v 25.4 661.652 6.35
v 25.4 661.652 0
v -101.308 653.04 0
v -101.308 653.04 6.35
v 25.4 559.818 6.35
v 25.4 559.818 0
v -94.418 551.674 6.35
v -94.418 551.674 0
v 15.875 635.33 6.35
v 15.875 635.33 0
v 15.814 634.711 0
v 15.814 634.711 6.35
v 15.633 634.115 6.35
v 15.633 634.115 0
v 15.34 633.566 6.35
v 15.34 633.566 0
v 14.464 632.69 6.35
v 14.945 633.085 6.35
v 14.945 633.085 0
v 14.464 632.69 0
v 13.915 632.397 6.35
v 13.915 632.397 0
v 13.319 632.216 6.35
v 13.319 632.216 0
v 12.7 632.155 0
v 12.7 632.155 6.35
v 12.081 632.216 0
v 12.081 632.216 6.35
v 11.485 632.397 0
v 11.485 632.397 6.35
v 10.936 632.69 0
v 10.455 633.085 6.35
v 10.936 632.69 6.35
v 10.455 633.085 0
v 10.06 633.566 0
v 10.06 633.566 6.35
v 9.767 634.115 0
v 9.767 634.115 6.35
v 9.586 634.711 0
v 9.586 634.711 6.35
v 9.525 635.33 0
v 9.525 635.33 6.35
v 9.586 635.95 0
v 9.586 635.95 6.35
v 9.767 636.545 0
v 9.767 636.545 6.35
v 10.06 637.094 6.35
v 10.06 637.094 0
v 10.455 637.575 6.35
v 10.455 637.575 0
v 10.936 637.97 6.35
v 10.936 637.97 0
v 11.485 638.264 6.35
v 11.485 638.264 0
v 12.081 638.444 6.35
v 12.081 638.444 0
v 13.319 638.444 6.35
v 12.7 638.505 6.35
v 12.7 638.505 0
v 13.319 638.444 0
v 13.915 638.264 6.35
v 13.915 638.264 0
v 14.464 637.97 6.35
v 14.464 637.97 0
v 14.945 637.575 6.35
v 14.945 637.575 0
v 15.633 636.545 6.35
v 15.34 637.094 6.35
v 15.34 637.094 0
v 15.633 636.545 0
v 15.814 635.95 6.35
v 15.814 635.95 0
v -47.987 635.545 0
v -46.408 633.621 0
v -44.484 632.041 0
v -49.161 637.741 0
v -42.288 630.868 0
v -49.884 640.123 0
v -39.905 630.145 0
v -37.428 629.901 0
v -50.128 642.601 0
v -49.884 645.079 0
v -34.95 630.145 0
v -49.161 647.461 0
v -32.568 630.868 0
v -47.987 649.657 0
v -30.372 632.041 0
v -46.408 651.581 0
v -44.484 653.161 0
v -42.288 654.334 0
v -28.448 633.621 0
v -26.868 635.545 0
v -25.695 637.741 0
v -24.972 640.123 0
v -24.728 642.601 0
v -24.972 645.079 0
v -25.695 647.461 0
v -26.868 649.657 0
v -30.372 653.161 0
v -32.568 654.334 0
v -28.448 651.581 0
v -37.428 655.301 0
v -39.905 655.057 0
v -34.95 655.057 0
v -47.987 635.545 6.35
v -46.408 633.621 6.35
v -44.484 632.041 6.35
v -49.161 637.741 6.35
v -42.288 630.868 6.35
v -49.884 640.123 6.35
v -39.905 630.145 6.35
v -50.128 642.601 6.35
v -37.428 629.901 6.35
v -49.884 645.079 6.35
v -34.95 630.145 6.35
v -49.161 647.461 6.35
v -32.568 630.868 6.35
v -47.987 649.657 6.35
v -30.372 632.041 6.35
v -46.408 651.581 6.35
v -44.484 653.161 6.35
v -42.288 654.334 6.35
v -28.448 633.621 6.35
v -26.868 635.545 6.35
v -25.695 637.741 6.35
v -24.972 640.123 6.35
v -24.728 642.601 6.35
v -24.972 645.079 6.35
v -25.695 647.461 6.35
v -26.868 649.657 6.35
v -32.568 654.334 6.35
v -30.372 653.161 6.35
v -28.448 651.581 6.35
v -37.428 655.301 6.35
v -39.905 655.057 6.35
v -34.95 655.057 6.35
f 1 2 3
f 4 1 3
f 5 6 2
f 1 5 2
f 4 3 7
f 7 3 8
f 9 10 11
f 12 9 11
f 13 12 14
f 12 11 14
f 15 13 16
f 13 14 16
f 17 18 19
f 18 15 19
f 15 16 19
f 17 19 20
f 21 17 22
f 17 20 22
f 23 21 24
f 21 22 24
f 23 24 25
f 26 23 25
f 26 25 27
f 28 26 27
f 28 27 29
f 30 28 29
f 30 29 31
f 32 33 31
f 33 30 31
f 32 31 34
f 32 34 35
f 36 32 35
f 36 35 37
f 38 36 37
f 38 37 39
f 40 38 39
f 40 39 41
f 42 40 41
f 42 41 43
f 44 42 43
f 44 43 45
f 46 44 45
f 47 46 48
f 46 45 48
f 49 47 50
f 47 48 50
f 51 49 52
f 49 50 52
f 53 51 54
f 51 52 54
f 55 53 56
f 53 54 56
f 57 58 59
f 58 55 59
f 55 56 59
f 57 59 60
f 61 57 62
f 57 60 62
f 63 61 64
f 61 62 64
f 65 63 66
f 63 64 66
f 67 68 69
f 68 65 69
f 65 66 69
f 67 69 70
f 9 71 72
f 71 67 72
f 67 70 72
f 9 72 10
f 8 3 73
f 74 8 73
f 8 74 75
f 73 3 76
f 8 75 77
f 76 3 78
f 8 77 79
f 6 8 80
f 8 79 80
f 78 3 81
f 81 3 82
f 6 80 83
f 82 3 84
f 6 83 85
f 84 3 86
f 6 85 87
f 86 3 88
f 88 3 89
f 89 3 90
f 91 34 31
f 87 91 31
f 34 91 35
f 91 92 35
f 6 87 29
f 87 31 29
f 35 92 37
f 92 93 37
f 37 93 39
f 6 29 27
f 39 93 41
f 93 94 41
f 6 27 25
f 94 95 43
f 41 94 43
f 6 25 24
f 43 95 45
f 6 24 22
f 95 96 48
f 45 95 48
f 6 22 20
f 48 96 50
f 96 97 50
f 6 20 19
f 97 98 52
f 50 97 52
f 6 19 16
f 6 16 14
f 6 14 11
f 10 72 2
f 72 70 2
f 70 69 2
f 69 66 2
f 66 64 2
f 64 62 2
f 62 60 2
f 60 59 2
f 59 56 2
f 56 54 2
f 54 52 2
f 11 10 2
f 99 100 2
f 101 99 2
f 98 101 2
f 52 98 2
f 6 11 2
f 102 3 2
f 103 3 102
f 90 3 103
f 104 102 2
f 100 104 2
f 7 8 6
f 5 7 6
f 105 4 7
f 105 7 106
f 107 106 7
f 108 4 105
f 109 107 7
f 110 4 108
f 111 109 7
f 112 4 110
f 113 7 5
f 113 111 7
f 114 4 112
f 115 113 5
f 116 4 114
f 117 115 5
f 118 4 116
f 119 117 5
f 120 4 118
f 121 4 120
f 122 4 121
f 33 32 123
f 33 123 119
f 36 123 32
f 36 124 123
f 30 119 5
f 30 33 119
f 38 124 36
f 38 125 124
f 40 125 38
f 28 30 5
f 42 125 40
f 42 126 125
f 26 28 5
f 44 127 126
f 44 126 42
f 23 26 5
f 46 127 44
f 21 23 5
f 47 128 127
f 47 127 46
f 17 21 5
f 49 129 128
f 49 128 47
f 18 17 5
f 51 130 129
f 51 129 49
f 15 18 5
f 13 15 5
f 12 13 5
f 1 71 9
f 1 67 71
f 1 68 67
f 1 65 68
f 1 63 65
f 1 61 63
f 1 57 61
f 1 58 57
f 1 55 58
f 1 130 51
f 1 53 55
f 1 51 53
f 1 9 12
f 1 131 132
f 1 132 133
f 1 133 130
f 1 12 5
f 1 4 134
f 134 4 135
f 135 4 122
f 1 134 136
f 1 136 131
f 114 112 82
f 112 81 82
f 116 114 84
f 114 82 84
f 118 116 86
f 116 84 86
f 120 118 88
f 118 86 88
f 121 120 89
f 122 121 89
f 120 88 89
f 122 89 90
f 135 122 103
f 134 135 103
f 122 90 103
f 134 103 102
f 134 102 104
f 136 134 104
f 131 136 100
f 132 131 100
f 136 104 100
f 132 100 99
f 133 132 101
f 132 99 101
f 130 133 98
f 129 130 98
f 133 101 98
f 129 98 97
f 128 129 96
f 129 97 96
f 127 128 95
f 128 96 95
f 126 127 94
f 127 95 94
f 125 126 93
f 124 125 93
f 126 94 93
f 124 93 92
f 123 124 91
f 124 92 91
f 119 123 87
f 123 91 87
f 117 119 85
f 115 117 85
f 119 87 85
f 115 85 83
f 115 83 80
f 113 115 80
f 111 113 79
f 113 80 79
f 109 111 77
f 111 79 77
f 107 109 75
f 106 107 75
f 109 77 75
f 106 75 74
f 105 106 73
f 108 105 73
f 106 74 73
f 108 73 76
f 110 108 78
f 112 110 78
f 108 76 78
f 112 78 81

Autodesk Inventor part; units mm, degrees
ref_plane "YZ Plane" through (0, 0, 0) normal (1, 0, 0) x (0, 1, 0)
ref_plane "XZ Plane" through (0, 0, 0) normal (0, 1, 0) x (-1, 0, 0)
ref_plane "XY Plane" through (0, 0, 0) normal (0, 0, 1) x (1, 0, 0)
sketch "Sketch1" plane through (0, 0, 0) normal (0, 0, 1) x (1, 0, 0)
  circle A0 centre (12.7, 635.3302) radius 3.175 projected
  circle A1 centre (12.7, 635.3302) radius 3.175 projected
  circle A2 centre (12.7, 723.9) radius 6.35 projected
  circle A3 centre (12.7, 12.7) radius 6.35 projected
  circle A4 centre (12.7, 368.3) radius 6.35 projected
  line L0 (25.4, 0) -> (0, 0) projected
  line L1 (0, 0) -> (0, 736.6) projected
  line L2 (25.4, 736.6) -> (0, 736.6) projected
  line L3 (25.4, 0) -> (25.4, 736.6) projected
  line L4 (25.4, 661.652) -> (-101.3077, 653.0401)
  line L5 (-101.3077, 653.0401) -> (-94.4182, 551.6739)
  line L6 (-94.4182, 551.6739) -> (25.4, 559.8176)
  line L7 (25.4, 661.652) -> (25.4, 559.8176)
  circle A5 centre (12.7, 635.3302) radius 3.175
  dimension "d0" = 101.6
  dimension "d1" = 127
  dimension "d2" = 25.4
extrude "Extrusion1" add sketch "Sketch1" along normal blind 6.35 contours L6 L1 L4 L3 | L6 L5 L4 L1
sketch "Sketch2" plane through (0, 0, 0) normal (0, 0, -1) x (-1, 0, 0)
  circle A0 centre (37.4278, 642.601) radius 12.7 projected
  point P0 (0, 0)
extrude "Extrusion2" cut sketch "Sketch2" against normal through all
properties part number "2018 Intake Plate"
